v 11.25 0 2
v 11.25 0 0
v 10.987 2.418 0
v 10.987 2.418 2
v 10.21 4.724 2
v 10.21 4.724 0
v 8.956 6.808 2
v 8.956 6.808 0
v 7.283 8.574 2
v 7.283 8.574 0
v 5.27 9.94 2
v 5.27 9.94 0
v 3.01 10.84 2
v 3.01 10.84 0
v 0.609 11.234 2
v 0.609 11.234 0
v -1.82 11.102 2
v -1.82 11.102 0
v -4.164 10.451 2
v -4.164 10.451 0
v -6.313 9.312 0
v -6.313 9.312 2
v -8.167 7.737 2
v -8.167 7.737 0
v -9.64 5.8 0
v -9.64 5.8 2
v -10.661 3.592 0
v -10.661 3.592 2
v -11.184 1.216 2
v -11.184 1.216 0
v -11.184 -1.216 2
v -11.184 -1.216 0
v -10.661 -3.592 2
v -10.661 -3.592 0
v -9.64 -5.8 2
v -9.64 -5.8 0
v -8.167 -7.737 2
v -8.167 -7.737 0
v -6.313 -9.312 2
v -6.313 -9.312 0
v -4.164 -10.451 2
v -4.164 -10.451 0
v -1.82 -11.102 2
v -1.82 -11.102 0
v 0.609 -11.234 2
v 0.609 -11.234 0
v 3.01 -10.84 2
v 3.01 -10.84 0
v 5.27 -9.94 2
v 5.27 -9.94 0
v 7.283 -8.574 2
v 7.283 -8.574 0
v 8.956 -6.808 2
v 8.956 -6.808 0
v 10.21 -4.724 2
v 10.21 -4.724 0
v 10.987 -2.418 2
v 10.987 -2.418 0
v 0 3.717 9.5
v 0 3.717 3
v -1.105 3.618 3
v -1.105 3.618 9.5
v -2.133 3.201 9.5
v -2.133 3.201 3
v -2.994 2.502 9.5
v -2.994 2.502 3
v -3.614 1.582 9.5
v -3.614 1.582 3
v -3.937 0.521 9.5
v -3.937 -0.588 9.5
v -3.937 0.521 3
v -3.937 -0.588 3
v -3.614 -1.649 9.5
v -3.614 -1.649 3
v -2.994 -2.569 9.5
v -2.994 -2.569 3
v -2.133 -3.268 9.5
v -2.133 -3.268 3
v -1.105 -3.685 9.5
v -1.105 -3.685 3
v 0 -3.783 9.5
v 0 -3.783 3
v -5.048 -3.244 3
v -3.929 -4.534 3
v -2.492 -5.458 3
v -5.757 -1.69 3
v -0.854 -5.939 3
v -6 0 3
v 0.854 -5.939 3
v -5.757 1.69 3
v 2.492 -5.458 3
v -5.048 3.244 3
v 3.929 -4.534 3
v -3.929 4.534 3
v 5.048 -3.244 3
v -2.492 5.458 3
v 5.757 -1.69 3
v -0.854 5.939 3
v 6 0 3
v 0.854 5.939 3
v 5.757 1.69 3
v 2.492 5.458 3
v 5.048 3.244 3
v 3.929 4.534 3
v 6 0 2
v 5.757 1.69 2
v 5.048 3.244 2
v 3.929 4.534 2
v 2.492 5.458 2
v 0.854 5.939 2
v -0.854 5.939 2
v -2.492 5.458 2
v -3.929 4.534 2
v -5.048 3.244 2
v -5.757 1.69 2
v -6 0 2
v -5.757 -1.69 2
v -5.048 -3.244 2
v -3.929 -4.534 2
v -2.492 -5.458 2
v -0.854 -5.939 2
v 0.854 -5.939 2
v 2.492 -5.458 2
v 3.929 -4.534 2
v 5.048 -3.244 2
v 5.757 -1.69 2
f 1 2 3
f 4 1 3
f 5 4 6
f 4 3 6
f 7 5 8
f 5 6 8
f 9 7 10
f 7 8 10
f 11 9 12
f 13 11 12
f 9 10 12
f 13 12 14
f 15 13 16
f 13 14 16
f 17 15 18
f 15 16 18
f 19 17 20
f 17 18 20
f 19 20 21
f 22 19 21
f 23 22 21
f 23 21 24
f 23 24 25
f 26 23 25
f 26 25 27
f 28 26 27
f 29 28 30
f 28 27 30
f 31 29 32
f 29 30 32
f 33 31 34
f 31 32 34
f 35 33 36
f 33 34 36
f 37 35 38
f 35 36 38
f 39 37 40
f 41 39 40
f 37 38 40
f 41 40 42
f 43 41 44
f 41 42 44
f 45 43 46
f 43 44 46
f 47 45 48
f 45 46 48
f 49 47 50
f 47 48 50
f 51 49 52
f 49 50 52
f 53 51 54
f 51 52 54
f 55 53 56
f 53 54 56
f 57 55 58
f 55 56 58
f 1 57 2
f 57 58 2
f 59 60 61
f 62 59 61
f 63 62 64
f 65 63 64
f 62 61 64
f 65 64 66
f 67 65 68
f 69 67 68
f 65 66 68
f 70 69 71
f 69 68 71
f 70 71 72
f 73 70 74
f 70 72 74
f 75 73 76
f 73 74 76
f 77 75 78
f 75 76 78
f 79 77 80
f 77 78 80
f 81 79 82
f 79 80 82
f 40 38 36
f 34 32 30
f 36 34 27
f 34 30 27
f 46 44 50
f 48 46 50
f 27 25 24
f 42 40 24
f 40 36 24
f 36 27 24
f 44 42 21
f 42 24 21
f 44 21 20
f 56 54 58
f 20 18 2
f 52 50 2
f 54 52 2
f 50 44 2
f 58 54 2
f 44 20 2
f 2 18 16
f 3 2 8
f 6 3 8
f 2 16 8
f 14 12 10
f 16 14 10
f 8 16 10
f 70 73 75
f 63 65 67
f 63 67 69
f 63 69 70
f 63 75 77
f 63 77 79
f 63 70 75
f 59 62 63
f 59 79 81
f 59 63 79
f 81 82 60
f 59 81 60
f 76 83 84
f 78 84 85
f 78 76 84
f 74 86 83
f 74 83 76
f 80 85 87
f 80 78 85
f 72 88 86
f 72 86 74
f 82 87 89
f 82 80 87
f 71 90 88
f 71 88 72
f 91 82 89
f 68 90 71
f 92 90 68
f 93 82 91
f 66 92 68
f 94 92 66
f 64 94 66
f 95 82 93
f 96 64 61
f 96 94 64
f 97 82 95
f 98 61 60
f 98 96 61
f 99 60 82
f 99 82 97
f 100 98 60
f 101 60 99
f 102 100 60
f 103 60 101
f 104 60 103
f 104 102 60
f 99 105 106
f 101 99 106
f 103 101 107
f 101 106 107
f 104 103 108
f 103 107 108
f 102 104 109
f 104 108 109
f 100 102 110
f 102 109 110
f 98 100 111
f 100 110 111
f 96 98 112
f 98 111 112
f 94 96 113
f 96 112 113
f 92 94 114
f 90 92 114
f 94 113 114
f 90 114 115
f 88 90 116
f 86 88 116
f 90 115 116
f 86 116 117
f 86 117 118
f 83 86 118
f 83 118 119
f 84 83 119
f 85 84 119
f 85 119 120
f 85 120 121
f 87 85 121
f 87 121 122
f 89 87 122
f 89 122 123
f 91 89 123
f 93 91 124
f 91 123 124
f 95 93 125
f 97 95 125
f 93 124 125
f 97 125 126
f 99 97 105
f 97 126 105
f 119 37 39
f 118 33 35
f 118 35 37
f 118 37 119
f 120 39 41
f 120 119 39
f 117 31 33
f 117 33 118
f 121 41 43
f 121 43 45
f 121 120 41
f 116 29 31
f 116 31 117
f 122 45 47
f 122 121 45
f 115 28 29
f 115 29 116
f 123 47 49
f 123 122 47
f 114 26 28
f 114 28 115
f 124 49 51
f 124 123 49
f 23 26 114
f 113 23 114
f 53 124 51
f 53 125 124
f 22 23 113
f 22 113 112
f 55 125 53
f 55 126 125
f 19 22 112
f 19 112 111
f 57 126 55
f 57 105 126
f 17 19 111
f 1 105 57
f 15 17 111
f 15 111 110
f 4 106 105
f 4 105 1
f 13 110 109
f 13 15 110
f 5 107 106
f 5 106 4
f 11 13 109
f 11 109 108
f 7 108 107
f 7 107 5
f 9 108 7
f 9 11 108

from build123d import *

# Parameters (mm, degrees)
F0_R     = 11.25
F1_DEPTH = 2
F2_R     = 6
F3_DEPTH = 1
F6_DEPTH = 6.5
F7_DEPTH = 6


with BuildPart() as f1:
    # F0 (on Top) → F1 (new body)
    with BuildSketch(Plane.XY):
        Circle(F0_R)
    extrude(amount=F1_DEPTH)

    # F2 (on face) → F3 (join)
    with BuildSketch(Plane.XY.offset(2)):
        Circle(F2_R)
    extrude(amount=F3_DEPTH)

    # F5 (on face) → F6 (join)
    with BuildSketch(Plane.XY.offset(3)):
        with BuildLine():
            ThreePointArc((0, 3.716564), (-3.978639, -0.033436), (0, -3.783436))
            Line((0, -3.783436), (0, 3.716564))
        make_face()
    extrude(amount=F6_DEPTH)

    # F5 (on face) → F7 (join)
    with BuildSketch(Plane.XY.offset(3)):
        with BuildLine():
            ThreePointArc((0, 3.716564), (-3.978639, -0.033436), (0, -3.783436))
            Line((0, -3.783436), (0, 3.716564))
        make_face()
    extrude(amount=F7_DEPTH)


solid = f1.part
